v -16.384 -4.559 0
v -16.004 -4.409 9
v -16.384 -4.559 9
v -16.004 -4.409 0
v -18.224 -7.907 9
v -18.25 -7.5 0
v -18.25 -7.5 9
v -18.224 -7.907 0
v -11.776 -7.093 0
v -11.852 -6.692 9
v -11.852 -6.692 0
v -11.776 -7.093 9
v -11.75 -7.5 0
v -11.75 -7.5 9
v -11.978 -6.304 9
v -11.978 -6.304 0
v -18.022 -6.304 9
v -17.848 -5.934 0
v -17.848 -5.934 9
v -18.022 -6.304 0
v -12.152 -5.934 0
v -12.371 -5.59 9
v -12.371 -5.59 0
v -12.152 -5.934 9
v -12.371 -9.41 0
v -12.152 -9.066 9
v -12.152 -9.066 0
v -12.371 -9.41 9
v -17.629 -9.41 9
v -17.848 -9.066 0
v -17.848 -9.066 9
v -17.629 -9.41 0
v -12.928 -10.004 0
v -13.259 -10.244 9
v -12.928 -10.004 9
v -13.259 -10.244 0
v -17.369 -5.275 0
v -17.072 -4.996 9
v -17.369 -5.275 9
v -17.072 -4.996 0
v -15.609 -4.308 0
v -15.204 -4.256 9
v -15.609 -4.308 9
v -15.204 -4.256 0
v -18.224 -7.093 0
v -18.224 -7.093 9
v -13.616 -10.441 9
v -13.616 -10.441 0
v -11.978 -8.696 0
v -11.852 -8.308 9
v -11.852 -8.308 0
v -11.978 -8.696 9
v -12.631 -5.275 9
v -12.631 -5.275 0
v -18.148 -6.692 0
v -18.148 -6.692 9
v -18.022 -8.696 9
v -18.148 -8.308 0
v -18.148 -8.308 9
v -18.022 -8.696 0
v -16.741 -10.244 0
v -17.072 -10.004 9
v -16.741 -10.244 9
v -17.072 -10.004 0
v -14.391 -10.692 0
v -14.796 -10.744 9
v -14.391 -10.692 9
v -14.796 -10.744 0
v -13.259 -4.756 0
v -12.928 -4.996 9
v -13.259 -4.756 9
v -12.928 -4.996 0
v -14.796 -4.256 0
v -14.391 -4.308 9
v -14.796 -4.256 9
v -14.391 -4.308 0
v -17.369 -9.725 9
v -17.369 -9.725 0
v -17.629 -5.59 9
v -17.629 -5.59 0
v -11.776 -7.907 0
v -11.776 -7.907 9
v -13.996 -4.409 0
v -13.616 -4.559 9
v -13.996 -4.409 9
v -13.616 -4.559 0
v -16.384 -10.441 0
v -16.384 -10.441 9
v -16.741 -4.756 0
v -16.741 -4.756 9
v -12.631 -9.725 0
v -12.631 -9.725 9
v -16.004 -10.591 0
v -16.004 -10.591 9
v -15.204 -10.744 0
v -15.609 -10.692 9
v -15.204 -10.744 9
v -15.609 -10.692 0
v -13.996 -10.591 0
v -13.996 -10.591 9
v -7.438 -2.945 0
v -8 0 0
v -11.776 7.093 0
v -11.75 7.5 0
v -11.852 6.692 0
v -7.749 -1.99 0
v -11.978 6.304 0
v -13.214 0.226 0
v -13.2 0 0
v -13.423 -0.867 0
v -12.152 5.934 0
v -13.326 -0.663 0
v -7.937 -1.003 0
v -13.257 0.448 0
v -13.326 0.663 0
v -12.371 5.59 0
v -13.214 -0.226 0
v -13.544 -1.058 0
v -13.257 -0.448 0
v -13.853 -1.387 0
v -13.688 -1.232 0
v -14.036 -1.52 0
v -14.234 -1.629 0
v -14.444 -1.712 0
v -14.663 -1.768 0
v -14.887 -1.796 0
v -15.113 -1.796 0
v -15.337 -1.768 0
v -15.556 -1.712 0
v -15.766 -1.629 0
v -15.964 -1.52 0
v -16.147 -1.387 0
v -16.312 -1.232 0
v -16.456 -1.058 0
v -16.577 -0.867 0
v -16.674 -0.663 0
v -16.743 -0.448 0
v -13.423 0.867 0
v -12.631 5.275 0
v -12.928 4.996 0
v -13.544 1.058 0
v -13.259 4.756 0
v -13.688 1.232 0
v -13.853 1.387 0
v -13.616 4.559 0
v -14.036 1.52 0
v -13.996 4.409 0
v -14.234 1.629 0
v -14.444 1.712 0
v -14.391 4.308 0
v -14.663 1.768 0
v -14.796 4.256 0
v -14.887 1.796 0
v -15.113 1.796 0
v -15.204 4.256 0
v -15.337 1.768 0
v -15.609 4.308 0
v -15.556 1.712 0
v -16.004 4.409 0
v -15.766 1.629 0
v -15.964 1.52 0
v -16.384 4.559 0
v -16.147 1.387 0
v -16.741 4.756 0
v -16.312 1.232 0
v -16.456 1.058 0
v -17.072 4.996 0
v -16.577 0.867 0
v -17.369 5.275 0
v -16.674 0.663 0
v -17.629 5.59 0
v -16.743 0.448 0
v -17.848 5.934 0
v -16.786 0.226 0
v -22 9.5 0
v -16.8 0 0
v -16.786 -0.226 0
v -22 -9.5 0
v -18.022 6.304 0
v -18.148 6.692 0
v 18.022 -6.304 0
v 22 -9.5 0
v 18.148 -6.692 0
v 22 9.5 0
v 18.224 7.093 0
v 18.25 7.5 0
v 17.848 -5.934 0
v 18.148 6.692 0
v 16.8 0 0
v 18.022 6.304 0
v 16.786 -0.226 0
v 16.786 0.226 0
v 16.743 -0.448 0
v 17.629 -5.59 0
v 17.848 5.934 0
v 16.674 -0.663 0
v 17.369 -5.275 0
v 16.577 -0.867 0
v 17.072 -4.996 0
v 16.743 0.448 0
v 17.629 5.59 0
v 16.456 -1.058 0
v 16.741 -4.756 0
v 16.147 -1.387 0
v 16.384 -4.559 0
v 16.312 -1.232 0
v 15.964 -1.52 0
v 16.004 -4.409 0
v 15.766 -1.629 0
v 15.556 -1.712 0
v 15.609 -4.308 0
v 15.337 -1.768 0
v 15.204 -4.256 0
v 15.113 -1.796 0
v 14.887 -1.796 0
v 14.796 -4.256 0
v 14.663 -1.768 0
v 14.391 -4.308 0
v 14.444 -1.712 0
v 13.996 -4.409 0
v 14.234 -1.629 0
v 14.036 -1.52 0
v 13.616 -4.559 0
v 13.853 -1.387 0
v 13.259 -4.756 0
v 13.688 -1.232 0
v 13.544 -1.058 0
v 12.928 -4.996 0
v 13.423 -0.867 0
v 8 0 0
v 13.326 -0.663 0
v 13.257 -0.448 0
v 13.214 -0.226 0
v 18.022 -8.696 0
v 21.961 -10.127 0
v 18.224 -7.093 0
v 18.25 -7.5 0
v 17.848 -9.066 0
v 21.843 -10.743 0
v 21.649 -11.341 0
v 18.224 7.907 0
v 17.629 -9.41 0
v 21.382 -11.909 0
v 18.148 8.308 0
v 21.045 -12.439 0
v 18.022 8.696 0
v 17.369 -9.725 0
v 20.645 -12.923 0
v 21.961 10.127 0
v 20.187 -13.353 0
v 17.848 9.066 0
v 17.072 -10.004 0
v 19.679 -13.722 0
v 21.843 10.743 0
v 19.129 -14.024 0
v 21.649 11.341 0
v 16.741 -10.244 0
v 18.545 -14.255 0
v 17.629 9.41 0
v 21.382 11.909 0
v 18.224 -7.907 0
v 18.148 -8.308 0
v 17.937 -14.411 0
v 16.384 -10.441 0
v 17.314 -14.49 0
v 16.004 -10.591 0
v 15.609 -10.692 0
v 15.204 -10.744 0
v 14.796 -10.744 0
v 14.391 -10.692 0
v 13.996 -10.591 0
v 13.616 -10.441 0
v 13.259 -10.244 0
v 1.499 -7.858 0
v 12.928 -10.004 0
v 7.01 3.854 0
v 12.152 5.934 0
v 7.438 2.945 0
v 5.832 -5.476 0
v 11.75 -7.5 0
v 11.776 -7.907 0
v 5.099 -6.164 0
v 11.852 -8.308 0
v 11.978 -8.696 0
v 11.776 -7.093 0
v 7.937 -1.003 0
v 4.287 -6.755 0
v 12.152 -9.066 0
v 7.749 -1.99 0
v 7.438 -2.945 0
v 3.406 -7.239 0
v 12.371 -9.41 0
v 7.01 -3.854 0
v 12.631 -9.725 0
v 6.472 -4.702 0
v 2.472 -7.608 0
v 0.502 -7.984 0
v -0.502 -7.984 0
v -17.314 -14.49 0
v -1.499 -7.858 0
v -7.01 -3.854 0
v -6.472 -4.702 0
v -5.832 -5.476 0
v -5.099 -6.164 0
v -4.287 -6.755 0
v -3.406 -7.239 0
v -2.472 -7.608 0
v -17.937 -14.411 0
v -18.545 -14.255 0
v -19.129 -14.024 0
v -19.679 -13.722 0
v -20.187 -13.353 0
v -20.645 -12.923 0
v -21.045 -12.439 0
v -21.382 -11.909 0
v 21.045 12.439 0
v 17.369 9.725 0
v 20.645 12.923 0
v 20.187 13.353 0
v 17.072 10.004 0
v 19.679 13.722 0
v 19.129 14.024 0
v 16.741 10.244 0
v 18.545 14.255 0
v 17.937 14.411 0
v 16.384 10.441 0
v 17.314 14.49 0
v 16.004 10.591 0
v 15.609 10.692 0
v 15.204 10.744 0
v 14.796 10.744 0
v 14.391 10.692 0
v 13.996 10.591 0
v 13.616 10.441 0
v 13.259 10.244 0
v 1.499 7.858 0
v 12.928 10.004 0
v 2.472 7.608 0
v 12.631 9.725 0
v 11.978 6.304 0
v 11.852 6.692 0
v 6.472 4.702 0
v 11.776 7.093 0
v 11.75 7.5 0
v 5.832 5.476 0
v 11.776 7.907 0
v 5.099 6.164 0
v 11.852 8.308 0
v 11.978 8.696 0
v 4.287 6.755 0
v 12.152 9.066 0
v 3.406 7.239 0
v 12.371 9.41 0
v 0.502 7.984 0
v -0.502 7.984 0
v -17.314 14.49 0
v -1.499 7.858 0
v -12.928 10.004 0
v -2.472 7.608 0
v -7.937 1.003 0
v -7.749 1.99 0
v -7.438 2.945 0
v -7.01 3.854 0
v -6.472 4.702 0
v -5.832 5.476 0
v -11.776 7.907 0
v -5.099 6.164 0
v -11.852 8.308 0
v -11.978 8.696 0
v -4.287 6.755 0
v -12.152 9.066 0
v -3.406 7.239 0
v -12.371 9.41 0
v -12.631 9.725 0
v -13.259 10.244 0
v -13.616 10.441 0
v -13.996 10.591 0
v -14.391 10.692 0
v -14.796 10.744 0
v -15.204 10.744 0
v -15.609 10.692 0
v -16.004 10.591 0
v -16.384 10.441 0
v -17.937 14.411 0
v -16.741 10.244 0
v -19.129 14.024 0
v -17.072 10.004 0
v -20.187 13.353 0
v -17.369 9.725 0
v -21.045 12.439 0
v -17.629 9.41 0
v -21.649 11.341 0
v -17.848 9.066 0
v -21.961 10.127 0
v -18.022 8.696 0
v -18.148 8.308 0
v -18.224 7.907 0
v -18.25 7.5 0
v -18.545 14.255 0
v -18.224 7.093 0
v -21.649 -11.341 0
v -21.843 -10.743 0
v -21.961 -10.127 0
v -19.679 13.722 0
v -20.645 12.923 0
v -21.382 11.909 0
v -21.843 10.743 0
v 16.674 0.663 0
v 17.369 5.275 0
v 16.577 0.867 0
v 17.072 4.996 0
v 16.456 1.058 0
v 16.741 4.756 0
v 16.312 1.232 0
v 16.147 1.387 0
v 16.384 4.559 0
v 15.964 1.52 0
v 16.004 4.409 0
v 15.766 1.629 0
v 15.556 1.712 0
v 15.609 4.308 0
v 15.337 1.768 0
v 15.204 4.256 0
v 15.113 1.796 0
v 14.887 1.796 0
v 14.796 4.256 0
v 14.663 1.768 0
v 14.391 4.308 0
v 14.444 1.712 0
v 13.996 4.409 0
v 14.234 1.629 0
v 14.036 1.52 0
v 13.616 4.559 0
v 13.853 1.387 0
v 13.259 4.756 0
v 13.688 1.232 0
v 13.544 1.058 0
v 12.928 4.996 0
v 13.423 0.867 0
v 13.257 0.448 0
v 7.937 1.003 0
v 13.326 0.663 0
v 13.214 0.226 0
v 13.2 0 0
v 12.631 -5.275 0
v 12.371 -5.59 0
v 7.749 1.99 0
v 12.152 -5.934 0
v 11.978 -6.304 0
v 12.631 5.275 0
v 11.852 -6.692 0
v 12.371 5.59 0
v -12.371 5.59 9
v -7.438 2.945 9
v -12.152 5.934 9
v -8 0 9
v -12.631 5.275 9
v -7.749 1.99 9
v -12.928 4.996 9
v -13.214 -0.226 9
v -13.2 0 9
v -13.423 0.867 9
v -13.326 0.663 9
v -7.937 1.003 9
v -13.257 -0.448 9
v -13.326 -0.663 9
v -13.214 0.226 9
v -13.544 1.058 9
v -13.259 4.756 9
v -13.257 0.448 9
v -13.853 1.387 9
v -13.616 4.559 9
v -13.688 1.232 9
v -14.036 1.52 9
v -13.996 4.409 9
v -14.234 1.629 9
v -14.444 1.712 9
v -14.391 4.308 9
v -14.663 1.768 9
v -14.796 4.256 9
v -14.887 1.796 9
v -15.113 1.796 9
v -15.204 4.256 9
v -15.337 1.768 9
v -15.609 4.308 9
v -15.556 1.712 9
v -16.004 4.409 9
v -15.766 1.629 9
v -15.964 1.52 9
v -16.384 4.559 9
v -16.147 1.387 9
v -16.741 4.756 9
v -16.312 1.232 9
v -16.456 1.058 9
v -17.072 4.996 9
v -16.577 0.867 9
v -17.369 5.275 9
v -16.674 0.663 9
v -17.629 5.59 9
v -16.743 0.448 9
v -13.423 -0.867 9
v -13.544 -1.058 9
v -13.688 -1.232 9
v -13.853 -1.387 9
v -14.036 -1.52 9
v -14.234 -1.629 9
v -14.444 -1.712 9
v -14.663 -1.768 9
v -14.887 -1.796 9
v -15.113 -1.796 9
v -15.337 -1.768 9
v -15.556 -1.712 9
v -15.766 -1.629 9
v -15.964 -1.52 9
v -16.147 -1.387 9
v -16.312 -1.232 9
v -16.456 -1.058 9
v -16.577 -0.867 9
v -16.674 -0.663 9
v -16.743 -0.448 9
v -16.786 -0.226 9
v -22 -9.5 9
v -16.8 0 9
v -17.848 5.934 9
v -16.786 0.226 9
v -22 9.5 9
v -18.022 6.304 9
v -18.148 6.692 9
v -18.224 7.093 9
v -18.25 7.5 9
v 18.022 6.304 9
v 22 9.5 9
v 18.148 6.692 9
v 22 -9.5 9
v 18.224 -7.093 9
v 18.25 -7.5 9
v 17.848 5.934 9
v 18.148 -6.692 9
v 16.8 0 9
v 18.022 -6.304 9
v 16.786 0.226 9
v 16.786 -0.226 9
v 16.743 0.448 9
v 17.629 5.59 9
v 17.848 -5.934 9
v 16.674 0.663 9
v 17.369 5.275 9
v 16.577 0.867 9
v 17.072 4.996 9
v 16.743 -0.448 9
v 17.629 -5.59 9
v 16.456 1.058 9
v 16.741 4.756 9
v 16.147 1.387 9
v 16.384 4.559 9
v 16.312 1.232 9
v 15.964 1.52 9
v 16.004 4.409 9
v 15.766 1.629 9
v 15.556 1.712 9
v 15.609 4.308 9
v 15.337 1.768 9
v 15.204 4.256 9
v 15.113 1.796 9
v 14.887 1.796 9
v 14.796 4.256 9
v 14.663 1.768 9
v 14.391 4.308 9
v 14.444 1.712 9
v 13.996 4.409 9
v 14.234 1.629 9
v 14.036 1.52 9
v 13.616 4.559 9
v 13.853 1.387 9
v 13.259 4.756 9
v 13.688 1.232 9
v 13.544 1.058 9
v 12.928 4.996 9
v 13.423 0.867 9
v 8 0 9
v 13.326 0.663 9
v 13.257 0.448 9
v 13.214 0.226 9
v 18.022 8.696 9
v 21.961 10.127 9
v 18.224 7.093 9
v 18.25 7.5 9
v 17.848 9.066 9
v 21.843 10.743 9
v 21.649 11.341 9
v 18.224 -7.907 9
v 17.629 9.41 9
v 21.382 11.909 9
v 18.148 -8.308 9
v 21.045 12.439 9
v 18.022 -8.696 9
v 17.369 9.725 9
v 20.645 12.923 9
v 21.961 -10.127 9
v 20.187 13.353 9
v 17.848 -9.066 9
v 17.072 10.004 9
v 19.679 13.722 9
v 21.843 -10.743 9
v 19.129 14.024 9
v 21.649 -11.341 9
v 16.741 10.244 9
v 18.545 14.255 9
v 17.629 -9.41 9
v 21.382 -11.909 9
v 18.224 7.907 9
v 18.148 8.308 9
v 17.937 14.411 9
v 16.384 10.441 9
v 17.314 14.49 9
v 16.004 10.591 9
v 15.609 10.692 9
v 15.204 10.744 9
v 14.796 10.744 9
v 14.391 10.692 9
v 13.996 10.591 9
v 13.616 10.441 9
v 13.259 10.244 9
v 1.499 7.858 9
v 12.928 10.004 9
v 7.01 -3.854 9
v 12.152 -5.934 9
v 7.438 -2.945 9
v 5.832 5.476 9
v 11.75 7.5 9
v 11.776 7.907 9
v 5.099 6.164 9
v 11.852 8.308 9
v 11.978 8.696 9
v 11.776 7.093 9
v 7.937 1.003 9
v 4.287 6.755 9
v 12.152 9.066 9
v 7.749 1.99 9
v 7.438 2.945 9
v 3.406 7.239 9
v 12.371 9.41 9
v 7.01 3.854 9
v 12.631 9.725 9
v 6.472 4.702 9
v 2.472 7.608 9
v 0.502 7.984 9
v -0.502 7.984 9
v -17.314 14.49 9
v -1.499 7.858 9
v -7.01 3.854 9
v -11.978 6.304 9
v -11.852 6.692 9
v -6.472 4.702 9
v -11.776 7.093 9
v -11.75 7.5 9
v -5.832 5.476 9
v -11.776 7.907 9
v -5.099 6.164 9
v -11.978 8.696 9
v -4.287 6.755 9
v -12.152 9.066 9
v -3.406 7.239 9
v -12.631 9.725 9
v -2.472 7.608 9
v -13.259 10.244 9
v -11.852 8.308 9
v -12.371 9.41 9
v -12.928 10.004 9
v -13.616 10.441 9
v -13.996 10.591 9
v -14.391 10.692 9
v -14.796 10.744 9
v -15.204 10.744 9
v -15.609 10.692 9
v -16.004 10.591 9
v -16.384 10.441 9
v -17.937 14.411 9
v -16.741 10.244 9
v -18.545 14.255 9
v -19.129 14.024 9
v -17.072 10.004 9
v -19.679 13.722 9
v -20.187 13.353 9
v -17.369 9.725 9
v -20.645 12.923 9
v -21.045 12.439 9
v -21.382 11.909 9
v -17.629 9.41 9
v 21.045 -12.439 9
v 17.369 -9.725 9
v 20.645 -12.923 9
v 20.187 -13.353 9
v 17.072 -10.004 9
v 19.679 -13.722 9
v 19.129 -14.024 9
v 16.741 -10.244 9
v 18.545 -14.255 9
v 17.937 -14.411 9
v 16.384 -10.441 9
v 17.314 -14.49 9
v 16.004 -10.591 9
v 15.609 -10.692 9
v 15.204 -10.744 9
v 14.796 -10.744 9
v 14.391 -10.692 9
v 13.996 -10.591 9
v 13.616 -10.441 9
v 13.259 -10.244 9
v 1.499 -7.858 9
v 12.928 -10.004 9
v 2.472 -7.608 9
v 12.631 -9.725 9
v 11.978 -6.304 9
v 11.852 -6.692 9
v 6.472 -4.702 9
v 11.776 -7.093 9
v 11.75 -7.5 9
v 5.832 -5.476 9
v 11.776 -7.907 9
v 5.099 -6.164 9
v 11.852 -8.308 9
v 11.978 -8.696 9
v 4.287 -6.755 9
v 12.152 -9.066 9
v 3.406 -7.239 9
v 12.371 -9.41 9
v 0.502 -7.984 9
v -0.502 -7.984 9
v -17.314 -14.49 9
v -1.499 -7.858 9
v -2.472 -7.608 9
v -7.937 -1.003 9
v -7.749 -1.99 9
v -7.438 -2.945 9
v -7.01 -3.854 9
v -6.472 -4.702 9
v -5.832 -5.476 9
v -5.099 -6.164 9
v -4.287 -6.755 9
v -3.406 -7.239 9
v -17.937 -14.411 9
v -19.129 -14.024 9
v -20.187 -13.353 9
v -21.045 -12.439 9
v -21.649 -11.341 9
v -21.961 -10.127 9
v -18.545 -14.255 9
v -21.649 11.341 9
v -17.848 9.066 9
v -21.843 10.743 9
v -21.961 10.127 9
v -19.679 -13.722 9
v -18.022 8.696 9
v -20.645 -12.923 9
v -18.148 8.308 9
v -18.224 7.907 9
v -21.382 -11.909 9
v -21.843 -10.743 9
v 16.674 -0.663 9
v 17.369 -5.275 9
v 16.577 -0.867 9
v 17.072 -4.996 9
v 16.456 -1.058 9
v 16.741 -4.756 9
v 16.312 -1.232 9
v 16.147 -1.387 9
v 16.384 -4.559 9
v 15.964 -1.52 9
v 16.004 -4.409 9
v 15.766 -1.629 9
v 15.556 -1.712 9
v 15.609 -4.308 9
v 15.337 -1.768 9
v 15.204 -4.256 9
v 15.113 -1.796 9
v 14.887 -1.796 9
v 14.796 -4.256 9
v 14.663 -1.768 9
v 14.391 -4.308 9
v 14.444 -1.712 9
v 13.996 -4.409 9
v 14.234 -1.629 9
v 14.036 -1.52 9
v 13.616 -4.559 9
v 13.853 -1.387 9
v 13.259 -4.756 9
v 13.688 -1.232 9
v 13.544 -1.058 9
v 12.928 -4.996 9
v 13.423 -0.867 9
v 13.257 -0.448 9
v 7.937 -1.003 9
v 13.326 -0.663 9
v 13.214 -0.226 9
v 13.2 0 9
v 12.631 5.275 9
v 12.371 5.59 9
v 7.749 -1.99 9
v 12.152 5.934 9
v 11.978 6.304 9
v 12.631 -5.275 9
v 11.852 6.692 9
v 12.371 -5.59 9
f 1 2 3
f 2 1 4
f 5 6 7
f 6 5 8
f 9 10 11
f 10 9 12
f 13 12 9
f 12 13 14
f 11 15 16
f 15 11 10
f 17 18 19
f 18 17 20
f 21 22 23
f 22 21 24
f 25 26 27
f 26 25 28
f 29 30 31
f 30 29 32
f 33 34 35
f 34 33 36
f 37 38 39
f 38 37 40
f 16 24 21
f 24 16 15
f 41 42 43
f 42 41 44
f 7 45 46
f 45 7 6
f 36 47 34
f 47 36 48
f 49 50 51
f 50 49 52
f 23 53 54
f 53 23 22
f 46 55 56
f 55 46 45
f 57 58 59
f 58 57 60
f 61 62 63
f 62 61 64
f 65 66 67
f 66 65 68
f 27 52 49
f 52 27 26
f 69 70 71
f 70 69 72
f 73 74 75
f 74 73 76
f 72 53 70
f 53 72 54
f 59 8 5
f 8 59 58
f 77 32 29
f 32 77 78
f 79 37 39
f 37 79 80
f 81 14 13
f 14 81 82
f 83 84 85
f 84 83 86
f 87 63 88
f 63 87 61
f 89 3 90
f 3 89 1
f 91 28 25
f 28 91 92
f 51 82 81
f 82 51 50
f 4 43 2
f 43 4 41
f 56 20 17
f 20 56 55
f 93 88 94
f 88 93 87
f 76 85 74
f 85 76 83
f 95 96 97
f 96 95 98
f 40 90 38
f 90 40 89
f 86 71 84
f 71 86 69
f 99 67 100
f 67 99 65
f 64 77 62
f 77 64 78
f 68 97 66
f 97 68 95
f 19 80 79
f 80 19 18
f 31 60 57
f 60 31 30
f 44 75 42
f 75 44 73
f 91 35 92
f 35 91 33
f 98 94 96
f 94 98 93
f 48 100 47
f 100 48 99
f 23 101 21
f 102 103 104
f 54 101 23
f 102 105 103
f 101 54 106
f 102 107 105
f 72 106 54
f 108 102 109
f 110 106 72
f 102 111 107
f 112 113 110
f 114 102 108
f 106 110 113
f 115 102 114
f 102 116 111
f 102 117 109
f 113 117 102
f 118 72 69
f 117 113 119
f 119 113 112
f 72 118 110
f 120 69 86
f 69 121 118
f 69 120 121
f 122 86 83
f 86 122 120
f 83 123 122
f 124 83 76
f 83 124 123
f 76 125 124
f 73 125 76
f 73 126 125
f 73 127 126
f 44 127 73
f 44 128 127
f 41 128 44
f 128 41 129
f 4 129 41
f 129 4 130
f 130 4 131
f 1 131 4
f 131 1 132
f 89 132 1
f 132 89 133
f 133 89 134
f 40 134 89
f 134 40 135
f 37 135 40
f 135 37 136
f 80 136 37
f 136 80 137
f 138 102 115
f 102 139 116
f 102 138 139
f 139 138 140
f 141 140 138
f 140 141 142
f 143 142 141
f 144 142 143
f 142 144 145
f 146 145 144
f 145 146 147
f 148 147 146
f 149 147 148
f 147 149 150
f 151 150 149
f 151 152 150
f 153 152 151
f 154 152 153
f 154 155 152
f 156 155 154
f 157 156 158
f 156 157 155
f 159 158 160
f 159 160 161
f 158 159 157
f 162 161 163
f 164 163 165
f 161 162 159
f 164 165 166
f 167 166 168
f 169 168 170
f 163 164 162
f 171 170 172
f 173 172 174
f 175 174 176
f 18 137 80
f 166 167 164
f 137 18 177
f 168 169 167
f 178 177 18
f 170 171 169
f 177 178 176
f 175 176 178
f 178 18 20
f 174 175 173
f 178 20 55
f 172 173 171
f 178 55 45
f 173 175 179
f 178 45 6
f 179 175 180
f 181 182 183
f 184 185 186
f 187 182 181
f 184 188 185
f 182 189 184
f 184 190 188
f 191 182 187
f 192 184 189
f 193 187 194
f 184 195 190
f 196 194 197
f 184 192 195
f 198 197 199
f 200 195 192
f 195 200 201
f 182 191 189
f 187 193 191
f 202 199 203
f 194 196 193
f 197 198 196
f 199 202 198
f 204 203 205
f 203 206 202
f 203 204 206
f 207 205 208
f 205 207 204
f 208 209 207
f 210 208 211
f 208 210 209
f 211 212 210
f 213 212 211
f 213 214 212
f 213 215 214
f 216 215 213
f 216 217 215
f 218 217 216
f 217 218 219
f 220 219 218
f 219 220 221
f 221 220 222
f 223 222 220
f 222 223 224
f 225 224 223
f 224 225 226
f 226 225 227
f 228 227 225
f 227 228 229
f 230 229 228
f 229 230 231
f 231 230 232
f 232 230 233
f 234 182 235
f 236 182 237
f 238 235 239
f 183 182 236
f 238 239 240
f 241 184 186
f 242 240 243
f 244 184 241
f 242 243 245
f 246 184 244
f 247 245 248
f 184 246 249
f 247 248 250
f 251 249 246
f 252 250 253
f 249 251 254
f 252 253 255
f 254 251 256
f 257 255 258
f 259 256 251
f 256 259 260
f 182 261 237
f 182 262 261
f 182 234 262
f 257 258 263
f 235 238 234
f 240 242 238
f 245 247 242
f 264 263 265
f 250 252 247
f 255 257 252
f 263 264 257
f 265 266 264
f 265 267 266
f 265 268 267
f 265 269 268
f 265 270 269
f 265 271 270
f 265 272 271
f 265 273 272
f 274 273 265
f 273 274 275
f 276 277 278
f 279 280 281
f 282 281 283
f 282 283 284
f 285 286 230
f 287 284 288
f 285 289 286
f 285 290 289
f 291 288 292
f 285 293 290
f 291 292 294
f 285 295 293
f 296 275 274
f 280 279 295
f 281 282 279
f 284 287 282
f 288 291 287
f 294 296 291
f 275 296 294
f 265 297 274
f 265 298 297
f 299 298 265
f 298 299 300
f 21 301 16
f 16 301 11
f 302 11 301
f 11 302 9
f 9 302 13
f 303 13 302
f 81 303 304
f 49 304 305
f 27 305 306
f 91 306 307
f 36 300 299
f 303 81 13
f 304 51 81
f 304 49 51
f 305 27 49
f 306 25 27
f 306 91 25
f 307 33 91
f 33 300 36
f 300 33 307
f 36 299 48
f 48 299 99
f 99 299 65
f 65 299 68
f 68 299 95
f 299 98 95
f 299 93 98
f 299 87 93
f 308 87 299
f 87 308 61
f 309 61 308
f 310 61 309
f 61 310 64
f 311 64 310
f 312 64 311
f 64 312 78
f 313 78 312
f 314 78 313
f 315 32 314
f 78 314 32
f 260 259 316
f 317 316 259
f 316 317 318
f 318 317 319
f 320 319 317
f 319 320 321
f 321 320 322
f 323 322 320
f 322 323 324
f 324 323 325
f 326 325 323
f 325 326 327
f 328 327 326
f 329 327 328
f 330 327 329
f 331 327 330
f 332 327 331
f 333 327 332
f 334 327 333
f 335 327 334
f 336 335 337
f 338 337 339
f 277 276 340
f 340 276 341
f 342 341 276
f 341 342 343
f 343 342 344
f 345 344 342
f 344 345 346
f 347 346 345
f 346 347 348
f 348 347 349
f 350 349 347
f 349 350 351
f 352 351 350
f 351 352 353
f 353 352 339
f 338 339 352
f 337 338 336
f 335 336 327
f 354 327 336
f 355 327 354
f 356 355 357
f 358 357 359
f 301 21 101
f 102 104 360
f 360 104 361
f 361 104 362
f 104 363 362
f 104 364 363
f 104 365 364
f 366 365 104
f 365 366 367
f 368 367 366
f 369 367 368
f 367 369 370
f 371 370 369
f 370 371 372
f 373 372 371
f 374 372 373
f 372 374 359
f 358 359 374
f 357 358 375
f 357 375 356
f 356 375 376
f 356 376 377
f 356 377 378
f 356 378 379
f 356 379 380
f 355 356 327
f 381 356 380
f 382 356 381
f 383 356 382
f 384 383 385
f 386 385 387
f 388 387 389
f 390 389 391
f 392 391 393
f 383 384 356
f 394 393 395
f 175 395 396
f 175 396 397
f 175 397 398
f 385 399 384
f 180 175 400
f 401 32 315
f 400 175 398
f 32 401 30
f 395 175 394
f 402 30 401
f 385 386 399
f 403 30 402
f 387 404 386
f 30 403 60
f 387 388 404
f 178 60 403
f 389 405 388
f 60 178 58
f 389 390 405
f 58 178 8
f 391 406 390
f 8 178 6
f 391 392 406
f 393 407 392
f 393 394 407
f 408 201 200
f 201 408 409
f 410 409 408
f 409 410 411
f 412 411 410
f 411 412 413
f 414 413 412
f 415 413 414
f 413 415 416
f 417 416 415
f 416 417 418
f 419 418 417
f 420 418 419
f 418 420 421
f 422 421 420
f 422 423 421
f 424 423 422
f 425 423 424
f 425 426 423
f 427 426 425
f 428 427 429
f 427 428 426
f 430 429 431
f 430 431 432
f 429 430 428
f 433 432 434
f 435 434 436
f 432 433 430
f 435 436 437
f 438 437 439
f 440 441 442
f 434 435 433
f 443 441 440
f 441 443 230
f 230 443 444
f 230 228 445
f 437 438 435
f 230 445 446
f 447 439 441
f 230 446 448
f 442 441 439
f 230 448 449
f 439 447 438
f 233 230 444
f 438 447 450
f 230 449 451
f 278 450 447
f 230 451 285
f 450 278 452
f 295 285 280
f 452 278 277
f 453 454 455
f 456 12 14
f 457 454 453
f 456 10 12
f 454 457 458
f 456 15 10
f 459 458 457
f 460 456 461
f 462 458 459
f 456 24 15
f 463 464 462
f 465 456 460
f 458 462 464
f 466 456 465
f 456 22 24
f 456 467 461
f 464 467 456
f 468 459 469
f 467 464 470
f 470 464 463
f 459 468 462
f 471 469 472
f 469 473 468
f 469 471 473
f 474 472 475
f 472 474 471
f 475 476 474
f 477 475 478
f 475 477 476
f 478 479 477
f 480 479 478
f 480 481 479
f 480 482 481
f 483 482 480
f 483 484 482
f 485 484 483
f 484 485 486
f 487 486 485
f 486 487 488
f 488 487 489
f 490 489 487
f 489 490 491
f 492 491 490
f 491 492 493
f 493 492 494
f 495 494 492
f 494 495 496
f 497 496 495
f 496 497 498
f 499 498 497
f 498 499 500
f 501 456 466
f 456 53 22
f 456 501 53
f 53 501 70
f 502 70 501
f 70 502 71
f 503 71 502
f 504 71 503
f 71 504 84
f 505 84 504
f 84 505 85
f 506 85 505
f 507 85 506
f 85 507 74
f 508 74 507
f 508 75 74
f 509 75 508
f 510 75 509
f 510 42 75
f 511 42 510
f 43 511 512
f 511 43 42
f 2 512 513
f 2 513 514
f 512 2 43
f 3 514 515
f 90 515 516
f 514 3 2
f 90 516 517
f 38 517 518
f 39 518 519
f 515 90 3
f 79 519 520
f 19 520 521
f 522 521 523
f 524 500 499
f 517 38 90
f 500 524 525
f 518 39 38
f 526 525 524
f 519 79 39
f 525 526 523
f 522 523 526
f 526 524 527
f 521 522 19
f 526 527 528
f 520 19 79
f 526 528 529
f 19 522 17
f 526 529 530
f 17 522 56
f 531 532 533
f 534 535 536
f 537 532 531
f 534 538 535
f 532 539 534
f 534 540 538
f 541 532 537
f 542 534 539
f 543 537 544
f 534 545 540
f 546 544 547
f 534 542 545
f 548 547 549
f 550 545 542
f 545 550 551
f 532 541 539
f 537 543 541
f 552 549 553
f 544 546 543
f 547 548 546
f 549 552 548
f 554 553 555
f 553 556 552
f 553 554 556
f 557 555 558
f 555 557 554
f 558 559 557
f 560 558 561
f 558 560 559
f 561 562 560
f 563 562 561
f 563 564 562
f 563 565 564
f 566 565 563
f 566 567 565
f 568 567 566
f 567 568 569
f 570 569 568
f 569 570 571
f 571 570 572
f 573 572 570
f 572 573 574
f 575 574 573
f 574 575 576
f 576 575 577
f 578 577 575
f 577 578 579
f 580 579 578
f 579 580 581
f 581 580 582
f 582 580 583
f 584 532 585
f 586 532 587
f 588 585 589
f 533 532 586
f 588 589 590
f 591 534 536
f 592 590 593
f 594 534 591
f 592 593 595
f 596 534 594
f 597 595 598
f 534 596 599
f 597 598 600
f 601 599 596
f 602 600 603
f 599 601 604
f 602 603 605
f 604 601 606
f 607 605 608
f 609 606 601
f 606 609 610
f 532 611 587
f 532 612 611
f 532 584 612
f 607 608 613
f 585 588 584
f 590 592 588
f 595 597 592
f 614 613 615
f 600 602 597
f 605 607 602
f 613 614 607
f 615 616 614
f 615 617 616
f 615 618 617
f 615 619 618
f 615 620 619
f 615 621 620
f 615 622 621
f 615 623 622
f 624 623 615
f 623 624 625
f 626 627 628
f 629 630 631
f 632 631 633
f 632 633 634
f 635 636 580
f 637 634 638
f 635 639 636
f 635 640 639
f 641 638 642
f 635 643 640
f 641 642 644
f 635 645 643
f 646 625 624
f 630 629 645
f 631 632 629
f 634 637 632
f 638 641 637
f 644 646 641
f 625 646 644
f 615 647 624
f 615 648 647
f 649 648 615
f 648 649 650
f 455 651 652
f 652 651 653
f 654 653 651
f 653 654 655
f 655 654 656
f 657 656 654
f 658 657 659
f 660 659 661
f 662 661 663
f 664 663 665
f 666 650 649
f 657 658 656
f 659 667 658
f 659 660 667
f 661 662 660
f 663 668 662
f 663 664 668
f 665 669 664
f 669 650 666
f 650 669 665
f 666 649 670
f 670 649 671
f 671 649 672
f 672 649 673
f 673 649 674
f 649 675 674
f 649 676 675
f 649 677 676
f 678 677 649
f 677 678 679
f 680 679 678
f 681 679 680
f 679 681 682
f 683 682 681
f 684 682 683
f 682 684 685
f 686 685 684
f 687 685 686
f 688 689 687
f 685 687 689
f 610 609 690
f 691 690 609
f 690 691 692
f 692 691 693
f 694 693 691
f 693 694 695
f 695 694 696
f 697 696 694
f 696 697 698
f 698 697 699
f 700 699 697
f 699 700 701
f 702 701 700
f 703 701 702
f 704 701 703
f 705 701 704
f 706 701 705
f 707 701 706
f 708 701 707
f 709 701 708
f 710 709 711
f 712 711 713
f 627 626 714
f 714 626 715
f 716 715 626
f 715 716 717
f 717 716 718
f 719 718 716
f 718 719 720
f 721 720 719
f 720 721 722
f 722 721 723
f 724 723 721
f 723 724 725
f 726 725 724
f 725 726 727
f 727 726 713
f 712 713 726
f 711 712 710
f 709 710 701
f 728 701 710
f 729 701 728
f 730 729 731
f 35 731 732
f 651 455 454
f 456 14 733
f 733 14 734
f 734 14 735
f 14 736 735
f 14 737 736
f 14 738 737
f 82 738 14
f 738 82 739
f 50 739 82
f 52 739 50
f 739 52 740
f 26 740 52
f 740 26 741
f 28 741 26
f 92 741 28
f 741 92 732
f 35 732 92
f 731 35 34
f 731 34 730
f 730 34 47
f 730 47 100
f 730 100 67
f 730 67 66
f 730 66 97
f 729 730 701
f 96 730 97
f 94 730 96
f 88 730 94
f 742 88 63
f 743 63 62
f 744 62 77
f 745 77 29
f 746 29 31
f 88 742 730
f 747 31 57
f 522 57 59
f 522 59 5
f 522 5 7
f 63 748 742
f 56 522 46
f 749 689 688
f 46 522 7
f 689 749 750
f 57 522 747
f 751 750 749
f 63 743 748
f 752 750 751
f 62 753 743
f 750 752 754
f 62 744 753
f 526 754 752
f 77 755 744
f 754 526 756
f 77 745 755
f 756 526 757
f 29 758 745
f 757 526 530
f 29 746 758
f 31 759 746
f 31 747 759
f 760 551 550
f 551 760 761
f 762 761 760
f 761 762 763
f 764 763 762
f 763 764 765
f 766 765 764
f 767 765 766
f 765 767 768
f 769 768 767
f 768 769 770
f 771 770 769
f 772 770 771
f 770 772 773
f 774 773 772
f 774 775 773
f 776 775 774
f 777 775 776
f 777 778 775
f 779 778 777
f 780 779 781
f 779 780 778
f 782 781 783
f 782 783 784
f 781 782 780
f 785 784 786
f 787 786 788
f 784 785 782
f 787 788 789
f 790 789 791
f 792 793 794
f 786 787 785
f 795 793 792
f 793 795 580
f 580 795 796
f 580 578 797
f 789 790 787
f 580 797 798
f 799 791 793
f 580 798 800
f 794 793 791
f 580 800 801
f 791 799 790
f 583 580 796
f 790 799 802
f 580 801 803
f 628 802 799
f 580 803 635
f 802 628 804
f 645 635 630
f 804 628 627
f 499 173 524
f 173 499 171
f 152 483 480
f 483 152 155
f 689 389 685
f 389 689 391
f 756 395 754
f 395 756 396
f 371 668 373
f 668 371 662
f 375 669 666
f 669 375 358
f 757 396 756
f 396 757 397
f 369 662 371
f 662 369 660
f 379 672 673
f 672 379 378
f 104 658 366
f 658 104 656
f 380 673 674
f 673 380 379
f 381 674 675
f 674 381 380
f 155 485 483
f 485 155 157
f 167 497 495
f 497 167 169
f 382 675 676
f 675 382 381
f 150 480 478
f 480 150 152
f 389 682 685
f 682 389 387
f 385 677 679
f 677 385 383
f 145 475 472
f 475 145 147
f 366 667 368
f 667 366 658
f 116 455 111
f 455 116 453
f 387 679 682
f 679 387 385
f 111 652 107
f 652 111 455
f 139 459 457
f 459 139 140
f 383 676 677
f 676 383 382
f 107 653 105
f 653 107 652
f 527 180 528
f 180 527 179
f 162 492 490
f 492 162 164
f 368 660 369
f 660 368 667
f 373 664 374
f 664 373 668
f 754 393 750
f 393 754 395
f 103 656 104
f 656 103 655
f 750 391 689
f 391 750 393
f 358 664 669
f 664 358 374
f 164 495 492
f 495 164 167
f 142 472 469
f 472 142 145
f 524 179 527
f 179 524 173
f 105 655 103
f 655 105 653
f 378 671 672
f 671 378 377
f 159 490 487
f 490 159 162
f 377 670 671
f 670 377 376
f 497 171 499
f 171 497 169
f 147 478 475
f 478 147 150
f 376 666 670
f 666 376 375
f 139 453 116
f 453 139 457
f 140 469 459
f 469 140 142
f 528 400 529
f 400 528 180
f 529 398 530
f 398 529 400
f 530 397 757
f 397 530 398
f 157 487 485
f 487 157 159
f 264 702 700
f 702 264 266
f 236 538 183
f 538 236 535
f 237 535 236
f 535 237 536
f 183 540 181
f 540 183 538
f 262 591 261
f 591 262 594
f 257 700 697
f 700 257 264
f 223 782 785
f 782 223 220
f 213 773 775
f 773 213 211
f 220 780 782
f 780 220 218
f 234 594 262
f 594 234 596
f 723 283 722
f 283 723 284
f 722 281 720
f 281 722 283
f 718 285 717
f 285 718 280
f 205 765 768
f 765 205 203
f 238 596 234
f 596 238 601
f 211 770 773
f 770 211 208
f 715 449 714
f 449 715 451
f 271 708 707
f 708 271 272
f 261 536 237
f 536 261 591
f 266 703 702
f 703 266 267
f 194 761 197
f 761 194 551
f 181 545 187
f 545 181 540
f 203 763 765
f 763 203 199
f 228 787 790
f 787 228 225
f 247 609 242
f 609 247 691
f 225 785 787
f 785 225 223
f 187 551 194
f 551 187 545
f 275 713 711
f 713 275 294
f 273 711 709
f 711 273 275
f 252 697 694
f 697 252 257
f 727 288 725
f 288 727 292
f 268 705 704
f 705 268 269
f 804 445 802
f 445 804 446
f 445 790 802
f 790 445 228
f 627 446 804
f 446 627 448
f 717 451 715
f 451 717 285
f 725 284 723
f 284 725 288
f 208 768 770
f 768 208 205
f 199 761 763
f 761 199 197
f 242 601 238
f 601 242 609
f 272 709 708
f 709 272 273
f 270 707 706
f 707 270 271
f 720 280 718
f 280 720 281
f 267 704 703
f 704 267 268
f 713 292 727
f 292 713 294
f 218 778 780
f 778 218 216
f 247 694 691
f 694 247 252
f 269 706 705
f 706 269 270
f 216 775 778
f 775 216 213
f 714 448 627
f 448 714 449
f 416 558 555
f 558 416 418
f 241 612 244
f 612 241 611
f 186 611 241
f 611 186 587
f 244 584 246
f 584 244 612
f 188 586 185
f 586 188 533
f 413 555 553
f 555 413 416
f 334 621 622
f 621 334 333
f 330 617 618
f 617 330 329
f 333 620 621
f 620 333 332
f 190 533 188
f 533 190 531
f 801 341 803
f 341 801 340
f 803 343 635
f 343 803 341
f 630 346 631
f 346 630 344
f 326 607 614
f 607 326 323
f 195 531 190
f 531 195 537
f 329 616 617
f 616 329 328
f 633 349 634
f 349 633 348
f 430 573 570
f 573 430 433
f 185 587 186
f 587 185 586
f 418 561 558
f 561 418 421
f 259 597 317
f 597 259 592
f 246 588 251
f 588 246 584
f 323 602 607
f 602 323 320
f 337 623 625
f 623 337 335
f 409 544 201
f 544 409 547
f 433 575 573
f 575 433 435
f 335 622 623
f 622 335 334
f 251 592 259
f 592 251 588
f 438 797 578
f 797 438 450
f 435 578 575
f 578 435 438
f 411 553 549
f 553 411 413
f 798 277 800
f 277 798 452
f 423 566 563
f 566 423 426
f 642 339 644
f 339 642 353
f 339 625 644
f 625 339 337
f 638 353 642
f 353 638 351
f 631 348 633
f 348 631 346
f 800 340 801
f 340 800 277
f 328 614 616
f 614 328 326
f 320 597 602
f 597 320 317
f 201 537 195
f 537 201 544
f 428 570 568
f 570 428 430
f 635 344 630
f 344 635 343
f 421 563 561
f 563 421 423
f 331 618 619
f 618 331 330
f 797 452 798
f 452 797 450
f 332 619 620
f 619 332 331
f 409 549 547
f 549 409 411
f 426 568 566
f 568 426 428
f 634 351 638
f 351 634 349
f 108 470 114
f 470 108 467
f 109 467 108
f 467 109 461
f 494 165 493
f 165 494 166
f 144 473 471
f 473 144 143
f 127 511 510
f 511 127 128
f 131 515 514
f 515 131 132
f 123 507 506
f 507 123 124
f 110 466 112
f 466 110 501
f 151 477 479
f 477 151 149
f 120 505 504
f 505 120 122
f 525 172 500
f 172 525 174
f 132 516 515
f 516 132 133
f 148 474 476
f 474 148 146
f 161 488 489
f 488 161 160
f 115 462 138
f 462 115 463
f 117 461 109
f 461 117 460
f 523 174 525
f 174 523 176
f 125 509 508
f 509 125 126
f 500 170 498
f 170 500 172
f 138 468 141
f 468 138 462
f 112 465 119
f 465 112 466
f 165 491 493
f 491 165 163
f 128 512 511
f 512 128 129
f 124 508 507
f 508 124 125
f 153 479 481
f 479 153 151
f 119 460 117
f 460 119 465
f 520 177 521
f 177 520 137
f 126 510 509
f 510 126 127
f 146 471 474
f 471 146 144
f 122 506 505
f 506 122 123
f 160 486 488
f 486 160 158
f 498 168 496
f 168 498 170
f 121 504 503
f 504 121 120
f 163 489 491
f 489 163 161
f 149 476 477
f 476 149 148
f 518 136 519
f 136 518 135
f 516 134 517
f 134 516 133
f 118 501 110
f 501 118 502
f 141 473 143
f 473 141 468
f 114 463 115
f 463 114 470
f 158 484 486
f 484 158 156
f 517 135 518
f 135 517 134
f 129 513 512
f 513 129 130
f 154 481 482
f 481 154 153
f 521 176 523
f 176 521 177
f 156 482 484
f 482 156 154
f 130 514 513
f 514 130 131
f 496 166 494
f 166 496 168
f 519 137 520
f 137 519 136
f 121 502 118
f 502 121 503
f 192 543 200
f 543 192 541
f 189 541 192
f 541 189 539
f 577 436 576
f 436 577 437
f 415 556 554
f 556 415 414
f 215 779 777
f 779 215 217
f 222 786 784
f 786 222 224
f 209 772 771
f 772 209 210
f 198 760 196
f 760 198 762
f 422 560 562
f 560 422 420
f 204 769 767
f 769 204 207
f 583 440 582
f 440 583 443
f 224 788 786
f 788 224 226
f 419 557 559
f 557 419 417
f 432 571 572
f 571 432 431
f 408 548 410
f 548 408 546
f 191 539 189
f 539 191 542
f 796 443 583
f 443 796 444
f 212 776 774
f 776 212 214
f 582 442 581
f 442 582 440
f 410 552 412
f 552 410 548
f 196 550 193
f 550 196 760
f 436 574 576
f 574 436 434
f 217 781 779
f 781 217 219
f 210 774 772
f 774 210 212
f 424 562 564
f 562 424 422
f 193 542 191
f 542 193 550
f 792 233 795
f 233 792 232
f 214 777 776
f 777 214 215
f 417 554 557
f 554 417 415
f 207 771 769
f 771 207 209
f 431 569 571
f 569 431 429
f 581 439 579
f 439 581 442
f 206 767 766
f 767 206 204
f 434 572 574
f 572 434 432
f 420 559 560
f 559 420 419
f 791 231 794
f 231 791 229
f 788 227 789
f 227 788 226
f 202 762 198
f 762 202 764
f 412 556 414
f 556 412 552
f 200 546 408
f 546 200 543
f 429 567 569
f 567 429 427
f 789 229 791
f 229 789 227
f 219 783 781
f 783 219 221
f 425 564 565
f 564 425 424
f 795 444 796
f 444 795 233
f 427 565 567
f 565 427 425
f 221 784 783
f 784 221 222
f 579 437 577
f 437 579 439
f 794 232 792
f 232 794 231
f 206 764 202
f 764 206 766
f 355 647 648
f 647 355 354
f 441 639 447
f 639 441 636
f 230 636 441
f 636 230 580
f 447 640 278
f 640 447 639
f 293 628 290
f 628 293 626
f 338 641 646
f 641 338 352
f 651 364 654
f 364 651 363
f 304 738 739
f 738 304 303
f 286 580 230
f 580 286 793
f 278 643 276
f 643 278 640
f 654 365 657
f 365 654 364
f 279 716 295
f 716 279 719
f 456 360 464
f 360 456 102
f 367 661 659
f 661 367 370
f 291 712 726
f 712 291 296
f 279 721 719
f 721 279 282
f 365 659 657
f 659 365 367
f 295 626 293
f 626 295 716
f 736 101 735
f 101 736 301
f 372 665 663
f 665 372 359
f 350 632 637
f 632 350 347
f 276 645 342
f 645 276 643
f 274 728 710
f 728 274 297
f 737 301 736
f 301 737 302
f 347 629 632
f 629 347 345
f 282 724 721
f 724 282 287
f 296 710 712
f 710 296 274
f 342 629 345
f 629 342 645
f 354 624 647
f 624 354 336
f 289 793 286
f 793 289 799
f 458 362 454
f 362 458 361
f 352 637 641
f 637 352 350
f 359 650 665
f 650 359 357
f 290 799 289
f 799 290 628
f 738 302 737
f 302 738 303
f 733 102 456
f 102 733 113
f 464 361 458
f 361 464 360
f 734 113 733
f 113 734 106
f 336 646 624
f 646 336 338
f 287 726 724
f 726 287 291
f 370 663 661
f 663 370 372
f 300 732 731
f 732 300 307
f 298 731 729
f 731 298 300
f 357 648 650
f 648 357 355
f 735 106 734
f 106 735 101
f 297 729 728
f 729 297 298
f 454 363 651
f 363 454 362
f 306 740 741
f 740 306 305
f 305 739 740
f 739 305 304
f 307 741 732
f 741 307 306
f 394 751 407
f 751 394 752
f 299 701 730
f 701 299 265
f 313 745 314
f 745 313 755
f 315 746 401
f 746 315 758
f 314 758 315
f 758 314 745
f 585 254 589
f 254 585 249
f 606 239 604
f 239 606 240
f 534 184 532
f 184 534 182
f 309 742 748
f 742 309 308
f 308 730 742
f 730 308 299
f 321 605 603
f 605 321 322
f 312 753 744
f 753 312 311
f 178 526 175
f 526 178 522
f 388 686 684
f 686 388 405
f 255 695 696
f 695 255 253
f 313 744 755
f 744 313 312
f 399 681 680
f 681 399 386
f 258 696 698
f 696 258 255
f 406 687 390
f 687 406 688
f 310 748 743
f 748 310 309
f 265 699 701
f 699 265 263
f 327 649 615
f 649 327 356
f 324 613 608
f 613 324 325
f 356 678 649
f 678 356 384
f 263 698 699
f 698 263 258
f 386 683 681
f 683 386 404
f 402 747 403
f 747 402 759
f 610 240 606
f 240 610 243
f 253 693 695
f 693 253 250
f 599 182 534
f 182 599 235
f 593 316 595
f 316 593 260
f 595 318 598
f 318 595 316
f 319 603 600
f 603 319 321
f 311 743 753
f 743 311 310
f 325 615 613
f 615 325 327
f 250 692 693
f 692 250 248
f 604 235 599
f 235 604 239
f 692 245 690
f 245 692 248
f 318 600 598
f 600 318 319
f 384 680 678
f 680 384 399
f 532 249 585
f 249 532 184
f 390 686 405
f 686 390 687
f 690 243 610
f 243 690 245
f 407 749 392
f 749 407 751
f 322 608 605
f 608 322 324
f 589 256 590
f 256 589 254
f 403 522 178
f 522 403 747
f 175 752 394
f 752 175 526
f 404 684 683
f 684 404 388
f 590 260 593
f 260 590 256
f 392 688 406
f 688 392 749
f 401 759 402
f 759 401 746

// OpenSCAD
$fn = 50;

difference() {
	union() {
		hull() {
			translate(v = [-17.0, 9.5, 0]) {
				cylinder(h = 9, r = 5);
			}
			translate(v = [17.0, 9.5, 0]) {
				cylinder(h = 9, r = 5);
			}
			translate(v = [-17.0, -9.5, 0]) {
				cylinder(h = 9, r = 5);
			}
			translate(v = [17.0, -9.5, 0]) {
				cylinder(h = 9, r = 5);
			}
		}
	}
	union() {
		translate(v = [-15.0, -7.5, 0]) {
			cylinder(h = 9, r = 3.25);
		}
		translate(v = [-15.0, 7.5, 0]) {
			cylinder(h = 9, r = 3.25);
		}
		translate(v = [15.0, -7.5, 0]) {
			cylinder(h = 9, r = 3.25);
		}
		translate(v = [15.0, 7.5, 0]) {
			cylinder(h = 9, r = 3.25);
		}
		translate(v = [-15.0, 0.0, 0]) {
			cylinder(h = 9, r = 1.8);
		}
		translate(v = [15.0, 0.0, 0]) {
			cylinder(h = 9, r = 1.8);
		}
		cylinder(h = 9, r = 8.0);
	}
}
